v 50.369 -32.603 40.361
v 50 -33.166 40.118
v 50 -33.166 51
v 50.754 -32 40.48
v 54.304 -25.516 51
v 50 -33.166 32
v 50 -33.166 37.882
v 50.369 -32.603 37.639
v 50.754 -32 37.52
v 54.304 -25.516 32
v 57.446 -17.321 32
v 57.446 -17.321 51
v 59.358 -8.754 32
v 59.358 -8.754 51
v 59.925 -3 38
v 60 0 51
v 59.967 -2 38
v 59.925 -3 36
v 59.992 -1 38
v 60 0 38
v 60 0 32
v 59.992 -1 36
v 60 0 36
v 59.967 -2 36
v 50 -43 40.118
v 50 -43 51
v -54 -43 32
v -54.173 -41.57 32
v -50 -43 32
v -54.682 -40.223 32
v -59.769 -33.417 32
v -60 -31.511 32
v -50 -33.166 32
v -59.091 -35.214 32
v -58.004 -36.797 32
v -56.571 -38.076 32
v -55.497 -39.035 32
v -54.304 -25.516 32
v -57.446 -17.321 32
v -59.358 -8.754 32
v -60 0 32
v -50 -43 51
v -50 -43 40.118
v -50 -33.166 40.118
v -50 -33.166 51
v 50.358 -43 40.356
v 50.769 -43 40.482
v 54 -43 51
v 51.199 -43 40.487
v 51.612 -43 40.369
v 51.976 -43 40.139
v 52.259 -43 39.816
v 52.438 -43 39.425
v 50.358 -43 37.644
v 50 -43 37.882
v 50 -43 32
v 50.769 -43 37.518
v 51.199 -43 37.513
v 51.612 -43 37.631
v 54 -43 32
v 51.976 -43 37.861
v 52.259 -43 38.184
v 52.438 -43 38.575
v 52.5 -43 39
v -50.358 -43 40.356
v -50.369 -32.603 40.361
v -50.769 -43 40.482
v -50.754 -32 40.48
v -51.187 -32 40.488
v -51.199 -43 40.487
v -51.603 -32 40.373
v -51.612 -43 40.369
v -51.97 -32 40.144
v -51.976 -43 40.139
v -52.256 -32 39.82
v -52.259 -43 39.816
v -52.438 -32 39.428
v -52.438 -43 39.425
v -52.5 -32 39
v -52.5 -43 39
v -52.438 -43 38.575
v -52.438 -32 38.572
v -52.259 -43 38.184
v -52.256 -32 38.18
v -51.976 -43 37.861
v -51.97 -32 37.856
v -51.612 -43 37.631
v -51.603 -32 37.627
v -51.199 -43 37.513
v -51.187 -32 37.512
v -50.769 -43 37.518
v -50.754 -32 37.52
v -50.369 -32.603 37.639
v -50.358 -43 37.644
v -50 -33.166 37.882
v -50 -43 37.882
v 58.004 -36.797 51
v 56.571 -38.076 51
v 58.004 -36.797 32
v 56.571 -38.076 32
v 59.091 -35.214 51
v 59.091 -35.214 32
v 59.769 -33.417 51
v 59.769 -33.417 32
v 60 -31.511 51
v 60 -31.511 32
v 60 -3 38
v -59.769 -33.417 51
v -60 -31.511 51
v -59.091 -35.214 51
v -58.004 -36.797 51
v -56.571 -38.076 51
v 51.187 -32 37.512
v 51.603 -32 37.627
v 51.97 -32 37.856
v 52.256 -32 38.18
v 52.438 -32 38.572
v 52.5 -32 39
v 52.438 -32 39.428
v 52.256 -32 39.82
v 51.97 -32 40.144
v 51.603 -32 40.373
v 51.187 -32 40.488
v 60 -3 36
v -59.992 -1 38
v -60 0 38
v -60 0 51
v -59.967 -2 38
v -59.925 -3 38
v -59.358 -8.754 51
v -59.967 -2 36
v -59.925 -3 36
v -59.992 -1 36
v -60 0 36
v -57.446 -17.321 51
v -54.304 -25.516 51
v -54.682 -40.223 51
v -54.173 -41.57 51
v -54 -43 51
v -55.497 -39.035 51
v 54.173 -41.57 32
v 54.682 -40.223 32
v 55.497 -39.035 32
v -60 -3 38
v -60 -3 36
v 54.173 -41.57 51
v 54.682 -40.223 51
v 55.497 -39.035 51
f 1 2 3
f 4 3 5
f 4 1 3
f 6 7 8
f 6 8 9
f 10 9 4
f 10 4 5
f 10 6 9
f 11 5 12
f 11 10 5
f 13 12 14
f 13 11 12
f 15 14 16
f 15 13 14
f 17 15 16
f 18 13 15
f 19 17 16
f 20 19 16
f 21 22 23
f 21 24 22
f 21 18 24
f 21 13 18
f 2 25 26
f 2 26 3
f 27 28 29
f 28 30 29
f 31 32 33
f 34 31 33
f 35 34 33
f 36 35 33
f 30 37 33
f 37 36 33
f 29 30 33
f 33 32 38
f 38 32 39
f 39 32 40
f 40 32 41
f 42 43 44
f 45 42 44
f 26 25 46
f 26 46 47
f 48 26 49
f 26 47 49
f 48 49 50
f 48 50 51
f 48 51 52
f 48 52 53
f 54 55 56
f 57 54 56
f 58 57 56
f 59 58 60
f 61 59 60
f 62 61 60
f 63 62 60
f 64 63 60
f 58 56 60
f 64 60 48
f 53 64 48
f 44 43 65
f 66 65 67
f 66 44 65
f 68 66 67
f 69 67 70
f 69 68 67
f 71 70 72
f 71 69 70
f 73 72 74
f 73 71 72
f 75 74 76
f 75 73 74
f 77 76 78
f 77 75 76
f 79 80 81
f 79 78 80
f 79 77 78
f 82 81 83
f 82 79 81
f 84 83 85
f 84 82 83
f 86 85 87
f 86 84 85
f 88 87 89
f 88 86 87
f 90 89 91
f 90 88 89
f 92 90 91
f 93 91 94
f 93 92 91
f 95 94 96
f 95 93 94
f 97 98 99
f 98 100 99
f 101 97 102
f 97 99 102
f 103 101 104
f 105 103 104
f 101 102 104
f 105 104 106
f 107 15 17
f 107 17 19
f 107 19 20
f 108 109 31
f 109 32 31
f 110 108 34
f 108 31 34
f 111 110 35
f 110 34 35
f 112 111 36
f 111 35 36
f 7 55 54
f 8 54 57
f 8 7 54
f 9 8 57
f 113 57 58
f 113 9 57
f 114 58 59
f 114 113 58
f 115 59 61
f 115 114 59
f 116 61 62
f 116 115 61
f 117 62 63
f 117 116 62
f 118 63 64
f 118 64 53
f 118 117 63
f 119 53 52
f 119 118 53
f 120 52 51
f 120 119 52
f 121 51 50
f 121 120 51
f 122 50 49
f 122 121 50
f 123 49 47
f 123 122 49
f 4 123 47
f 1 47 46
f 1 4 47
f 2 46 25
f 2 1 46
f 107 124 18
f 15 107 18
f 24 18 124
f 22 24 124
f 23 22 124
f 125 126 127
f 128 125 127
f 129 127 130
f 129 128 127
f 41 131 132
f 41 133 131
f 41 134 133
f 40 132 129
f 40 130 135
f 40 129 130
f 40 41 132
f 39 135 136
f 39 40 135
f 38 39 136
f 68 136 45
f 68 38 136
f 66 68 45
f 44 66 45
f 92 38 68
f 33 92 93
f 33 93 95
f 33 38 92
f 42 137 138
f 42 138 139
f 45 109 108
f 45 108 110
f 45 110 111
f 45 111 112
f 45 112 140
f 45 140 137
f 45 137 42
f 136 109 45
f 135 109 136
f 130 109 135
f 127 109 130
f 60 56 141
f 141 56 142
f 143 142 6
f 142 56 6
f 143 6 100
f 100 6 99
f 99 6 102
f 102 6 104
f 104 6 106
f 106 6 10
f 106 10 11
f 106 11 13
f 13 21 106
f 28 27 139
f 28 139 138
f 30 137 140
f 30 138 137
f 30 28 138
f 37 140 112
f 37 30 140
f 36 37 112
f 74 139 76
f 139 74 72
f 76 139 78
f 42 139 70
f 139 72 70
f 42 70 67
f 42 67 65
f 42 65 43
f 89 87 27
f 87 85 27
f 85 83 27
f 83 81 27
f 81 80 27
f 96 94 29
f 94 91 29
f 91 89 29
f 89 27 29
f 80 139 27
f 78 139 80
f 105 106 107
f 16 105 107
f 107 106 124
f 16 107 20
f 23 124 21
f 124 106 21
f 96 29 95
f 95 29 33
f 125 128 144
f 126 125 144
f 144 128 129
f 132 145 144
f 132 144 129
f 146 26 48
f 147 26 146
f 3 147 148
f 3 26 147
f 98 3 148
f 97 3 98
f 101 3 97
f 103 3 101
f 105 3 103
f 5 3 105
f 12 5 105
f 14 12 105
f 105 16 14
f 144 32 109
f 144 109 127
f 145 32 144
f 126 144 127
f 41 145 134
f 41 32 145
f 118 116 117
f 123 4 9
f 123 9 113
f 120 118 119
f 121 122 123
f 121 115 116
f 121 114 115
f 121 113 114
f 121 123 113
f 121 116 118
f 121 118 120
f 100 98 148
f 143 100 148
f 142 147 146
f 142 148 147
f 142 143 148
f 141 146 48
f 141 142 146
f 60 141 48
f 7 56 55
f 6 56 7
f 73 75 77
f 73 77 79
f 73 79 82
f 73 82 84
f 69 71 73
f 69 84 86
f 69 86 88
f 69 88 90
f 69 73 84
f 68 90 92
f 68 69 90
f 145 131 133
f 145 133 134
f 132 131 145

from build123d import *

# Parameters (mm, degrees)
CYLINDER1426_R               = 1.5
CYLINDER1426_DEPTH           = 40
CYLINDER1425_R               = 1.5
CYLINDER1425_DEPTH           = 40
BOX473_W                     = 6
BOX473_H                     = 10
BOX473_DEPTH                 = 2
BOX473_PLACEMENT_ANGLE       = 225
BOX471_W                     = 6
BOX471_H                     = 10
BOX471_DEPTH                 = 2
BOX470_W                     = 6
BOX470_H                     = 10
BOX470_DEPTH                 = 2
BOX470_PLACEMENT_ANGLE       = 45
BOX469_W                     = 6
BOX469_H                     = 10
BOX469_DEPTH                 = 2
BOX468_W                     = 6
BOX468_H                     = 10
BOX468_DEPTH                 = 2
BOX468_PLACEMENT_ANGLE       = 45
BOX467_W                     = 6
BOX467_H                     = 10
BOX467_DEPTH                 = 2
BOX466_W                     = 6
BOX466_H                     = 10
BOX466_DEPTH                 = 2
BOX466_PLACEMENT_ANGLE       = 135
BOX472_W                     = 6
BOX472_H                     = 10
BOX472_DEPTH                 = 2
CYLINDER1424_R               = 60
CYLINDER1424_DEPTH           = 33
CYLINDER1416_R               = 6
CYLINDER1416_DEPTH           = 33
CYLINDER1414_R               = 6
CYLINDER1414_DEPTH           = 33
CYLINDER1422_R               = 1.5
CYLINDER1422_DEPTH           = 50
CYLINDER1422_PLACEMENT_ANGLE = 45
CYLINDER1418_R               = 1.5
CYLINDER1418_DEPTH           = 50
CYLINDER1415_R               = 1.5
CYLINDER1415_DEPTH           = 50
CYLINDER1415_PLACEMENT_ANGLE = 135
CYLINDER1419_R               = 1.5
CYLINDER1419_DEPTH           = 50
CYLINDER1417_R               = 1.5
CYLINDER1417_DEPTH           = 50
CYLINDER1417_PLACEMENT_ANGLE = 225
CYLINDER1420_R               = 1.5
CYLINDER1420_DEPTH           = 50
CYLINDER1423_R               = 1.5
CYLINDER1423_DEPTH           = 50
CYLINDER1423_PLACEMENT_ANGLE = 45
CYLINDER1421_R               = 1.5
CYLINDER1421_DEPTH           = 50
BOX465_W                     = 10
BOX465_H                     = 43
BOX465_DEPTH                 = 19
BOX464_W                     = 10
BOX464_H                     = 43
BOX464_DEPTH                 = 19
FILLET019_R                  = 8


with BuildPart() as v_lec1426:
    # Cylinder1426 → Cylinder1426 (new body)
    with BuildSketch(Plane(origin=(51, -40, 25), x_dir=(1, 0, 0), z_dir=(0, -1, 0))):
        Circle(CYLINDER1426_R)
    extrude(amount=CYLINDER1426_DEPTH)


with BuildPart() as compound856:
    # Cylinder1425 → Cylinder1425 (new body)
    with BuildSketch(Plane(origin=(-51, -40, 25), x_dir=(1, 0, 0), z_dir=(0, -1, 0))):
        Circle(CYLINDER1425_R)
    extrude(amount=CYLINDER1425_DEPTH)

    # Compound856: union Válec1426
    add(v_lec1426.part)


with BuildPart() as compound856_1:
    # Compound856 placement: moved
    add(compound856.part.moved(Location((0, 8, 2))))


with BuildPart() as krychle473:
    # Box473 → Box473 (new body)
    with BuildSketch(Plane.XY):
        with Locations((3, 5)):
            Rectangle(BOX473_W, BOX473_H)
    extrude(amount=BOX473_DEPTH)


with BuildPart() as krychle473_1:
    # Box473 placement: moved
    add(krychle473.part.moved(Location((-41.7193, 45.961941, 23))).rotate(Axis((-41.7193, 45.961941, 23), (0, 0, 1)), BOX473_PLACEMENT_ANGLE))


with BuildPart() as krychle471:
    # Box471 → Box471 (new body)
    with BuildSketch(Plane(origin=(-62, 3, 23), x_dir=(0, -1, 0), z_dir=(0, 0, 1))):
        with Locations((3, 5)):
            Rectangle(BOX471_W, BOX471_H)
    extrude(amount=BOX471_DEPTH)


with BuildPart() as krychle470:
    # Box470 → Box470 (new body)
    with BuildSketch(Plane.XY):
        with Locations((3, 5)):
            Rectangle(BOX470_W, BOX470_H)
    extrude(amount=BOX470_DEPTH)


with BuildPart() as krychle470_1:
    # Box470 placement: moved
    add(krychle470.part.moved(Location((-45.961941, -41.7193, 23))).rotate(Axis((-45.961941, -41.7193, 23), (0, 0, -1)), BOX470_PLACEMENT_ANGLE))


with BuildPart() as krychle469:
    # Box469 → Box469 (new body)
    with BuildSketch(Plane(origin=(-3, -62, 23), x_dir=(1, 0, 0), z_dir=(0, 0, 1))):
        with Locations((3, 5)):
            Rectangle(BOX469_W, BOX469_H)
    extrude(amount=BOX469_DEPTH)


with BuildPart() as krychle468:
    # Box468 → Box468 (new body)
    with BuildSketch(Plane.XY):
        with Locations((3, 5)):
            Rectangle(BOX468_W, BOX468_H)
    extrude(amount=BOX468_DEPTH)


with BuildPart() as krychle468_1:
    # Box468 placement: moved
    add(krychle468.part.moved(Location((41.7193, -45.961941, 23))).rotate(Axis((41.7193, -45.961941, 23), (0, 0, 1)), BOX468_PLACEMENT_ANGLE))


with BuildPart() as krychle467:
    # Box467 → Box467 (new body)
    with BuildSketch(Plane(origin=(62, -3, 23), x_dir=(0, 1, 0), z_dir=(0, 0, 1))):
        with Locations((3, 5)):
            Rectangle(BOX467_W, BOX467_H)
    extrude(amount=BOX467_DEPTH)


with BuildPart() as krychle466:
    # Box466 → Box466 (new body)
    with BuildSketch(Plane.XY):
        with Locations((3, 5)):
            Rectangle(BOX466_W, BOX466_H)
    extrude(amount=BOX466_DEPTH)


with BuildPart() as krychle466_1:
    # Box466 placement: moved
    add(krychle466.part.moved(Location((45.961941, 41.7193, 23))).rotate(Axis((45.961941, 41.7193, 23), (0, 0, 1)), BOX466_PLACEMENT_ANGLE))


with BuildPart() as compound857:
    # Box472 → Box472 (new body)
    with BuildSketch(Plane(origin=(3, 62, 23), x_dir=(-1, 0, 0), z_dir=(0, 0, 1))):
        with Locations((3, 5)):
            Rectangle(BOX472_W, BOX472_H)
    extrude(amount=BOX472_DEPTH)

    # Compound857: union Krychle473, Krychle471, Krychle470, Krychle469, Krychle468, Krychle467, Krychle466
    add(krychle473_1.part)
    add(krychle471.part)
    add(krychle470_1.part)
    add(krychle469.part)
    add(krychle468_1.part)
    add(krychle467.part)
    add(krychle466_1.part)


with BuildPart() as compound857_1:
    # Compound857 placement: moved
    add(compound857.part.moved(Location((0, 0, 1))))


with BuildPart() as v_lec1424:
    # Cylinder1424 → Cylinder1424 (new body)
    with BuildSketch(Plane.XY.offset(20)):
        Circle(CYLINDER1424_R)
    extrude(amount=CYLINDER1424_DEPTH)


with BuildPart() as v_lec1416:
    # Cylinder1416 → Cylinder1416 (new body)
    with BuildSketch(Plane(origin=(-60, -43, 10), x_dir=(1, 0, 0), z_dir=(0, 0, 1))):
        Circle(CYLINDER1416_R)
    extrude(amount=CYLINDER1416_DEPTH)


with BuildPart() as compound858:
    # Cylinder1414 → Cylinder1414 (new body)
    with BuildSketch(Plane(origin=(60, -43, 10), x_dir=(1, 0, 0), z_dir=(0, 0, 1))):
        Circle(CYLINDER1414_R)
    extrude(amount=CYLINDER1414_DEPTH)

    # Compound858: union Válec1416
    add(v_lec1416.part)


with BuildPart() as v_lec1422:
    # Cylinder1422 → Cylinder1422 (new body)
    with BuildSketch(Plane.XY):
        Circle(CYLINDER1422_R)
    extrude(amount=CYLINDER1422_DEPTH)


with BuildPart() as v_lec1422_1:
    # Cylinder1422 placement: moved
    add(v_lec1422.part.moved(Location((39.59798, -39.59798, 2))).rotate(Axis((39.59798, -39.59798, 2), (0, 0, 1)), CYLINDER1422_PLACEMENT_ANGLE))


with BuildPart() as v_lec1418:
    # Cylinder1418 → Cylinder1418 (new body)
    with BuildSketch(Plane(origin=(56, 0, 2), x_dir=(0, 1, 0), z_dir=(0, 0, 1))):
        Circle(CYLINDER1418_R)
    extrude(amount=CYLINDER1418_DEPTH)


with BuildPart() as v_lec1415:
    # Cylinder1415 → Cylinder1415 (new body)
    with BuildSketch(Plane.XY):
        Circle(CYLINDER1415_R)
    extrude(amount=CYLINDER1415_DEPTH)


with BuildPart() as v_lec1415_1:
    # Cylinder1415 placement: moved
    add(v_lec1415.part.moved(Location((39.59798, 39.59798, 2))).rotate(Axis((39.59798, 39.59798, 2), (0, 0, 1)), CYLINDER1415_PLACEMENT_ANGLE))


with BuildPart() as v_lec1419:
    # Cylinder1419 → Cylinder1419 (new body)
    with BuildSketch(Plane(origin=(0, 56, 2), x_dir=(-1, 0, 0), z_dir=(0, 0, 1))):
        Circle(CYLINDER1419_R)
    extrude(amount=CYLINDER1419_DEPTH)


with BuildPart() as v_lec1417:
    # Cylinder1417 → Cylinder1417 (new body)
    with BuildSketch(Plane.XY):
        Circle(CYLINDER1417_R)
    extrude(amount=CYLINDER1417_DEPTH)


with BuildPart() as v_lec1417_1:
    # Cylinder1417 placement: moved
    add(v_lec1417.part.moved(Location((-39.59798, 39.59798, 2))).rotate(Axis((-39.59798, 39.59798, 2), (0, 0, 1)), CYLINDER1417_PLACEMENT_ANGLE))


with BuildPart() as v_lec1420:
    # Cylinder1420 → Cylinder1420 (new body)
    with BuildSketch(Plane(origin=(-56, 0, 2), x_dir=(0, -1, 0), z_dir=(0, 0, 1))):
        Circle(CYLINDER1420_R)
    extrude(amount=CYLINDER1420_DEPTH)


with BuildPart() as v_lec1423:
    # Cylinder1423 → Cylinder1423 (new body)
    with BuildSketch(Plane.XY):
        Circle(CYLINDER1423_R)
    extrude(amount=CYLINDER1423_DEPTH)


with BuildPart() as v_lec1423_1:
    # Cylinder1423 placement: moved
    add(v_lec1423.part.moved(Location((-39.59798, -39.59798, 2))).rotate(Axis((-39.59798, -39.59798, 2), (0, 0, -1)), CYLINDER1423_PLACEMENT_ANGLE))


with BuildPart() as compound854:
    # Cylinder1421 → Cylinder1421 (new body)
    with BuildSketch(Plane(origin=(0, -56, 2), x_dir=(1, 0, 0), z_dir=(0, 0, 1))):
        Circle(CYLINDER1421_R)
    extrude(amount=CYLINDER1421_DEPTH)

    # Compound854: union Válec1422, Válec1418, Válec1415, Válec1419, Válec1417, Válec1420, Válec1423
    add(v_lec1422_1.part)
    add(v_lec1418.part)
    add(v_lec1415_1.part)
    add(v_lec1419.part)
    add(v_lec1417_1.part)
    add(v_lec1420.part)
    add(v_lec1423_1.part)


with BuildPart() as krychle465:
    # Box465 → Box465 (new body)
    with BuildSketch(Plane(origin=(50, -43, 10), x_dir=(1, 0, 0), z_dir=(0, 0, 1))):
        with Locations((5, 21.5)):
            Rectangle(BOX465_W, BOX465_H)
    extrude(amount=BOX465_DEPTH)


with BuildPart() as fillet019:
    # Box464 → Box464 (new body)
    with BuildSketch(Plane(origin=(-60, -43, 10), x_dir=(1, 0, 0), z_dir=(0, 0, 1))):
        with Locations((5, 21.5)):
            Rectangle(BOX464_W, BOX464_H)
    extrude(amount=BOX464_DEPTH)

    # Compound859: union Krychle465
    add(krychle465.part)

    # Cut460: cut Compound854
    add(compound854.part, mode=Mode.SUBTRACT)

    # Cut461: cut Compound858
    add(compound858.part, mode=Mode.SUBTRACT)


with BuildPart() as fillet019_1:
    # Cut461 placement: moved
    add(fillet019.part.moved(Location((0, 0, 10))))

    # Cut465: cut Válec1424
    add(v_lec1424.part, mode=Mode.SUBTRACT)

    # Cut466: cut Compound857
    add(compound857_1.part, mode=Mode.SUBTRACT)

    # Cut467: cut Compound856
    add(compound856_1.part, mode=Mode.SUBTRACT)


with BuildPart() as fillet019_2:
    # Cut467 placement: moved
    add(fillet019_1.part.moved(Location((0, 0, 12))))

    # Fillet019
    fillet019_edges = [fillet019_2.edges().sort_by_distance(p)[0] for p in [
        (-60, -37, 41.5),
        (60, -37, 41.5),
    ]]
    fillet(fillet019_edges, radius=FILLET019_R)


solid = fillet019_2.part
